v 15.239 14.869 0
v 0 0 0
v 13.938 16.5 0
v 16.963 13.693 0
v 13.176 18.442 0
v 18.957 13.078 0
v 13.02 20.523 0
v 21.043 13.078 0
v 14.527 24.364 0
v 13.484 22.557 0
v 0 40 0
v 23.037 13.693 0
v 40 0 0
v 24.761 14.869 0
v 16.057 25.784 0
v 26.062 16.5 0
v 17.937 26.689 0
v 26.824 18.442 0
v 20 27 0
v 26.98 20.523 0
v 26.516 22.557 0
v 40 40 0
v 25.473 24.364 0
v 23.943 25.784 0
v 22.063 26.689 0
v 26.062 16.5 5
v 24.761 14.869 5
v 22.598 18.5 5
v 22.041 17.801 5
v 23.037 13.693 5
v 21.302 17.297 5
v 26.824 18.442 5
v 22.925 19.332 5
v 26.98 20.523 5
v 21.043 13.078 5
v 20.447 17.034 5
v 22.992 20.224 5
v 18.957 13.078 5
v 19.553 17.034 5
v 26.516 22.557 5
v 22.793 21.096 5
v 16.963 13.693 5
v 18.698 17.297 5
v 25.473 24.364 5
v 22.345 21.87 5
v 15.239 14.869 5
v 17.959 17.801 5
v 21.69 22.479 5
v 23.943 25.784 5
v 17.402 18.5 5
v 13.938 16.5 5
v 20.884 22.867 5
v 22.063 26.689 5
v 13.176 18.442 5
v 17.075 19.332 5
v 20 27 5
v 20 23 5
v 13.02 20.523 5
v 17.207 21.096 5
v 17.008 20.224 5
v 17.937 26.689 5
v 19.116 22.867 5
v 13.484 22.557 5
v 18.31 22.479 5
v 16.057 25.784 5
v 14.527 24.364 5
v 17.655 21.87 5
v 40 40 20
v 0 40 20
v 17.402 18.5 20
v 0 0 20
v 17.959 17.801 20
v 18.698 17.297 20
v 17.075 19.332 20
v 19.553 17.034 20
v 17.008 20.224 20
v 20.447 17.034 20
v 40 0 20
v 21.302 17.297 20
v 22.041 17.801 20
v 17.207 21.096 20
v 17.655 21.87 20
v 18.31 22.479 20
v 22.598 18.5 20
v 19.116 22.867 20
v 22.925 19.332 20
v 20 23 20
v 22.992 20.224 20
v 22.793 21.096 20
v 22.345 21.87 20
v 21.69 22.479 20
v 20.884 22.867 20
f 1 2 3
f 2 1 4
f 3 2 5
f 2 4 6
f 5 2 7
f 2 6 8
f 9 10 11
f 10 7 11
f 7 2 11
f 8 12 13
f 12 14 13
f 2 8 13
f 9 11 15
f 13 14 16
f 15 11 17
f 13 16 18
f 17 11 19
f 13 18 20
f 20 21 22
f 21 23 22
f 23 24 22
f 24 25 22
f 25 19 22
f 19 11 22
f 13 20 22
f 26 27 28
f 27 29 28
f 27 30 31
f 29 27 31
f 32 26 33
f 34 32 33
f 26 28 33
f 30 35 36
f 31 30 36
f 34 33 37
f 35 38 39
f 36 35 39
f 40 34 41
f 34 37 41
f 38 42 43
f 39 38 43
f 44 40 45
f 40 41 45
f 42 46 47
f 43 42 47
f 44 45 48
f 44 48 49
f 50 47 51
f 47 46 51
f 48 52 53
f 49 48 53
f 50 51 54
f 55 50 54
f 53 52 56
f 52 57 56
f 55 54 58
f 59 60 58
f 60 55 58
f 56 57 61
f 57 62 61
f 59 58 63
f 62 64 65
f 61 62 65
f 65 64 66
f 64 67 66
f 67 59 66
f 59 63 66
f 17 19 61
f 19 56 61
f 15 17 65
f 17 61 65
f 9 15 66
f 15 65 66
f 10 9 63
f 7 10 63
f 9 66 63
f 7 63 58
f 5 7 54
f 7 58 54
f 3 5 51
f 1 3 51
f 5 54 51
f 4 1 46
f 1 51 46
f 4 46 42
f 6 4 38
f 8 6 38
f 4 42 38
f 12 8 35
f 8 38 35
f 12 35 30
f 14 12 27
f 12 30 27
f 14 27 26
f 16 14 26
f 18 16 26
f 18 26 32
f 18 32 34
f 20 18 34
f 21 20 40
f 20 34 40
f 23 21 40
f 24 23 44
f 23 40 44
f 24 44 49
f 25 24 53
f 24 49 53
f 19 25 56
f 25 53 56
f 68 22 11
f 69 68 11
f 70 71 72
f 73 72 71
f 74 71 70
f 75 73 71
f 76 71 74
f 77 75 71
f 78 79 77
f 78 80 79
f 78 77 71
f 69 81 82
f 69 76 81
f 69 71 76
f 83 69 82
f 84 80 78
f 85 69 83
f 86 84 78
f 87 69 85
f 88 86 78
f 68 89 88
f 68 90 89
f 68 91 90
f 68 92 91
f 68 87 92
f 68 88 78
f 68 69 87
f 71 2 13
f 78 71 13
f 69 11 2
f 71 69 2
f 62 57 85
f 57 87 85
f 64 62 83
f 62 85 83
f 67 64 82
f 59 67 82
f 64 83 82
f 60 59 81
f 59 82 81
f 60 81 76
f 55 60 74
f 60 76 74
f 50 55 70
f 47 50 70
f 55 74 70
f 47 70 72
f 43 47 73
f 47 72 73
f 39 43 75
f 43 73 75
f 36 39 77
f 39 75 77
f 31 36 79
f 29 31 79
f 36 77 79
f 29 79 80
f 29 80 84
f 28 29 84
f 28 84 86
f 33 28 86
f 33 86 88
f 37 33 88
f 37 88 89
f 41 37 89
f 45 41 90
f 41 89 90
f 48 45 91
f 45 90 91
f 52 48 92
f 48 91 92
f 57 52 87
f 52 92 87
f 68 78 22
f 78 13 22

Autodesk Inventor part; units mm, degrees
ref_plane "YZ Plane" through (0, 0, 0) normal (1, 0, 0) x (0, 1, 0)
ref_plane "XZ Plane" through (0, 0, 0) normal (0, 1, 0) x (-1, 0, 0)
ref_plane "XY Plane" through (0, 0, 0) normal (0, 0, 1) x (1, 0, 0)
sketch "Sketch1" plane through (0, 0, 0) normal (0, 0, 1) x (1, 0, 0)
  line L0 (0, 0) -> (40, 0)
  line L1 (40, 0) -> (40, 40)
  line L2 (40, 40) -> (0, 40)
  line L3 (0, 40) -> (0, 0)
extrude "Extrusion1" add sketch "Sketch1" along normal blind 20
sketch "Sketch2" plane through (0, 0, 0) normal (0, 0, 1) x (1, 0, 0)
  point P0 (20, 20)
hole "Hole1" at (20, 20, 0) direction (0, 0, 1) diameter 6 end through all counterbore diameter 14 counterbore depth 5
properties part number "25_hole_counterbore"
